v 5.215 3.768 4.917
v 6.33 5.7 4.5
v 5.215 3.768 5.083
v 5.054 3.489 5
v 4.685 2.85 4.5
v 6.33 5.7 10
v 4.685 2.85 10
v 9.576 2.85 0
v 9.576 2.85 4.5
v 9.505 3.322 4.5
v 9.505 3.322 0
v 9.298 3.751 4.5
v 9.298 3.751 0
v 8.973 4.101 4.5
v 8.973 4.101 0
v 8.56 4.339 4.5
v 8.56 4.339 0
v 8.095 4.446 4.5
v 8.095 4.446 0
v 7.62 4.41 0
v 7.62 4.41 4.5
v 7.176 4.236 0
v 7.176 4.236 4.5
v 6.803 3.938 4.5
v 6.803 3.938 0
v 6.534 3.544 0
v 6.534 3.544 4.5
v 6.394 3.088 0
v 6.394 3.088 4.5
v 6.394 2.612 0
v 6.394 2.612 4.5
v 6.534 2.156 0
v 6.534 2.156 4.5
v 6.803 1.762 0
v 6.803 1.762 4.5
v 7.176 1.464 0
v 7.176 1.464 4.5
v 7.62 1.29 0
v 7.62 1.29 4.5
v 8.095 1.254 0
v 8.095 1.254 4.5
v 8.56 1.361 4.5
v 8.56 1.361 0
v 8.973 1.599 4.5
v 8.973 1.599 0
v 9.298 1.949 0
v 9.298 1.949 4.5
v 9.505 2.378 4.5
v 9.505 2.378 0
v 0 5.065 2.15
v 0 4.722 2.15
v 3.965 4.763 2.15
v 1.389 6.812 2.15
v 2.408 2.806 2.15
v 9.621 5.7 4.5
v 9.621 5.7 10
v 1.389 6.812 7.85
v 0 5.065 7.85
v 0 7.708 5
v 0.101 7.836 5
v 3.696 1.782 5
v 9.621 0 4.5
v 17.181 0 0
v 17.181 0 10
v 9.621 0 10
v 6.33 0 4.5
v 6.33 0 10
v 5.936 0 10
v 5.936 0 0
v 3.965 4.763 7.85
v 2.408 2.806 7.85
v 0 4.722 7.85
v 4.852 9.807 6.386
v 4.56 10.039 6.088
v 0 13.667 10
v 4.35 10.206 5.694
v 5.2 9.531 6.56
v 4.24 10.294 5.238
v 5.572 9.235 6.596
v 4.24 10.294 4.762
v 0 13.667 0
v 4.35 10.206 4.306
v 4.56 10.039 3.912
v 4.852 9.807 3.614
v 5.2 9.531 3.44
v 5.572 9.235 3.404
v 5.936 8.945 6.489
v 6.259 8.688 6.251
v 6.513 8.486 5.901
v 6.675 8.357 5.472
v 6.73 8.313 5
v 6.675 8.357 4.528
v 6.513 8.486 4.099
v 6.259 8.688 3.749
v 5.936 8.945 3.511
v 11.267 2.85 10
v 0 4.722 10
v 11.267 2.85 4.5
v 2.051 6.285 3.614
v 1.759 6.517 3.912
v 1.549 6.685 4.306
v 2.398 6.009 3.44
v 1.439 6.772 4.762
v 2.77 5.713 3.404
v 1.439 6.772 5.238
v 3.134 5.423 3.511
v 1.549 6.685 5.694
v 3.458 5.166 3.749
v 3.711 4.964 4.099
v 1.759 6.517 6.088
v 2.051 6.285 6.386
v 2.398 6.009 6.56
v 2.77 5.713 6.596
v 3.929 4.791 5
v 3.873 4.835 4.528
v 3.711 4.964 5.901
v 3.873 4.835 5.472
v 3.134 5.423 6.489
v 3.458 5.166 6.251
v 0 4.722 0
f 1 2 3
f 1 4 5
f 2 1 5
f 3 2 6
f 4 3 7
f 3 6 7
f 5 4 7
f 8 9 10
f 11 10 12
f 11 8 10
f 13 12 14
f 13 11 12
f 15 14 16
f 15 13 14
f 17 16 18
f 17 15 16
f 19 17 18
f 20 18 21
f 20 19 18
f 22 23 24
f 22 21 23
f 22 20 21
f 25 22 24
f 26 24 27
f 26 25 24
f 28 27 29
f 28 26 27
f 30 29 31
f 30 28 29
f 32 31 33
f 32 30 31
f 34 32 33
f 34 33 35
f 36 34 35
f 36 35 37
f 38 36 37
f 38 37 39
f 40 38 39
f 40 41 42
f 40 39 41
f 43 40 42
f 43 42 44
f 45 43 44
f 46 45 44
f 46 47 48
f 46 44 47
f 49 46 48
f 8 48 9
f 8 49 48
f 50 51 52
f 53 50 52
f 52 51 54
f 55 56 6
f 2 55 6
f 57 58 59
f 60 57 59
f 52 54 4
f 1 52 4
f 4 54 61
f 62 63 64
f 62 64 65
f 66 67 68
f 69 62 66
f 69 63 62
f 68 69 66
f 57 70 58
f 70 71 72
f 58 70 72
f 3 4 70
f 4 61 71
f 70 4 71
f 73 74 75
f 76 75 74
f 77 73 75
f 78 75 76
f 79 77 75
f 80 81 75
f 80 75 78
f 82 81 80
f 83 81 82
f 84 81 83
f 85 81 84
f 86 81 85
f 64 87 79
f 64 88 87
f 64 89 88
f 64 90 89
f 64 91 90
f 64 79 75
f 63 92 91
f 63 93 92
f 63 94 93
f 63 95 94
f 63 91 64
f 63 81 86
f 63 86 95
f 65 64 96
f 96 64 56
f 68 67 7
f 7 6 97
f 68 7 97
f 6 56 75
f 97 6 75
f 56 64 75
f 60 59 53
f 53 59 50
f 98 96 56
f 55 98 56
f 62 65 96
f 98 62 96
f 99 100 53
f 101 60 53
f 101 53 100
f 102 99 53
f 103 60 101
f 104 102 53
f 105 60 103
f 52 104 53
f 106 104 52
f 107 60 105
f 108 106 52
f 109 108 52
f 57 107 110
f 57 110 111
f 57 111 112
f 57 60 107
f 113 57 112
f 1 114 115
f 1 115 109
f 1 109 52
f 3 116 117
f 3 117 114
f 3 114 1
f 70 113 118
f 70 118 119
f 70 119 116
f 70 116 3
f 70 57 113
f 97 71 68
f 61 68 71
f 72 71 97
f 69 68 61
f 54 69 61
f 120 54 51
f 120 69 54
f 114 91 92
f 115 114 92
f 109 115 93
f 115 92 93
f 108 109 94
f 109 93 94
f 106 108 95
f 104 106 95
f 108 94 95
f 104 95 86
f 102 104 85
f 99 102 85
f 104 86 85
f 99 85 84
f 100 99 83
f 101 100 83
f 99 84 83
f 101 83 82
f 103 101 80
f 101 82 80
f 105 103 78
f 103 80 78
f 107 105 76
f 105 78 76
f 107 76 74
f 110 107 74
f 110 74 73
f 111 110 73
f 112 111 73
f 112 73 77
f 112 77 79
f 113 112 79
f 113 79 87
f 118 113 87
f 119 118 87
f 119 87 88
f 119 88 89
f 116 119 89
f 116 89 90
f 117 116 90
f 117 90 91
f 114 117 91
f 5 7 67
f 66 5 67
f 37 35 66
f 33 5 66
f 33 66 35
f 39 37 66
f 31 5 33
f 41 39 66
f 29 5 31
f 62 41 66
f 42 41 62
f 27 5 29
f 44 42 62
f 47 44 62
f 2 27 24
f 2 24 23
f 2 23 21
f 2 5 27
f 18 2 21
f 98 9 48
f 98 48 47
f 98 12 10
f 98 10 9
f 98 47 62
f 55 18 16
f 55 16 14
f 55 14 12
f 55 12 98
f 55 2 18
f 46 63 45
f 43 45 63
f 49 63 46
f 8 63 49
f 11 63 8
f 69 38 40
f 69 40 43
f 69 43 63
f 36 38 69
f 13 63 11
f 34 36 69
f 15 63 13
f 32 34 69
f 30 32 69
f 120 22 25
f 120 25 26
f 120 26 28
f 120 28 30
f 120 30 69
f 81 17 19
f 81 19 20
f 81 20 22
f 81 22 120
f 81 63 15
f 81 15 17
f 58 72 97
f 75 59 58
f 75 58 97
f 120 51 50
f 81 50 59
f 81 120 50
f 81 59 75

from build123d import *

# Parameters (mm, degrees)
CROQUIS1_R              = 1.6
SALIENTE_EXTRUIR1_DEPTH = 10
CORTAR_EXTRUIR1_DEPTH   = 5.5
CORTAR_EXTRUIR2_REACH   = 12.696
CROQUIS3_R              = 1.6
CORTAR_EXTRUIR3_DEPTH   = 2.5


with BuildPart() as part:
    # Croquis1 → Saliente-Extruir1 (new body)
    with BuildSketch(Plane.XY):
        Polygon((17.180905327, 0), (5.936351089, 0), (0, 4.722097457), (0, 13.666629237), align=None)
        with Locations((7.975771065, 2.85)):
            Circle(CROQUIS1_R, mode=Mode.SUBTRACT)
    extrude(amount=SALIENTE_EXTRUIR1_DEPTH)

    # Croquis2 → Cortar-Extruir1 (cut)
    with BuildSketch(Plane.XY.offset(10)):
        Polygon((6.330322798, 0), (9.621219332, 0), (11.2666676, 2.85), (9.621219332, 5.7), (6.330322798, 5.7), (4.684874531, 2.85), align=None)
    extrude(amount=-CORTAR_EXTRUIR1_DEPTH, mode=Mode.SUBTRACT)

    # Croquis3 → Cortar-Extruir2 (cut, up to next)
    with BuildSketch(Plane(origin=(6.658212283, 8.370324012, 0), x_dir=(0.782601054, -0.622523566, 0), z_dir=(0.622523566, 0.782601054, 0)), mode=Mode.PRIVATE) as cortar_extruir2_sk1:
        with Locations((-1.507798766, -5)):
            Circle(CROQUIS3_R)
    cortar_extruir2_tool1 = extrude(cortar_extruir2_sk1.sketch, amount=-CORTAR_EXTRUIR2_REACH, mode=Mode.PRIVATE) & part.part
    add(cortar_extruir2_tool1.solids().sort_by_distance((5.478207, 9.308964, 5))[0], mode=Mode.SUBTRACT)

    # Croquis4 → Cortar-Extruir3 (cut)
    with BuildSketch(Plane(origin=(2.300547322, 2.892116633, 0), x_dir=(0.782601054, -0.622523566, 0), z_dir=(-0.622523566, -0.782601054, 0))):
        Polygon((1.783097769, 5), (0.137649502, 7.85), (-3.153247033, 7.85), (-4.7986953, 5), (-3.153247033, 2.15), (0.137649502, 2.15), align=None)
    extrude(amount=-CORTAR_EXTRUIR3_DEPTH, mode=Mode.SUBTRACT)


solid = part.part
